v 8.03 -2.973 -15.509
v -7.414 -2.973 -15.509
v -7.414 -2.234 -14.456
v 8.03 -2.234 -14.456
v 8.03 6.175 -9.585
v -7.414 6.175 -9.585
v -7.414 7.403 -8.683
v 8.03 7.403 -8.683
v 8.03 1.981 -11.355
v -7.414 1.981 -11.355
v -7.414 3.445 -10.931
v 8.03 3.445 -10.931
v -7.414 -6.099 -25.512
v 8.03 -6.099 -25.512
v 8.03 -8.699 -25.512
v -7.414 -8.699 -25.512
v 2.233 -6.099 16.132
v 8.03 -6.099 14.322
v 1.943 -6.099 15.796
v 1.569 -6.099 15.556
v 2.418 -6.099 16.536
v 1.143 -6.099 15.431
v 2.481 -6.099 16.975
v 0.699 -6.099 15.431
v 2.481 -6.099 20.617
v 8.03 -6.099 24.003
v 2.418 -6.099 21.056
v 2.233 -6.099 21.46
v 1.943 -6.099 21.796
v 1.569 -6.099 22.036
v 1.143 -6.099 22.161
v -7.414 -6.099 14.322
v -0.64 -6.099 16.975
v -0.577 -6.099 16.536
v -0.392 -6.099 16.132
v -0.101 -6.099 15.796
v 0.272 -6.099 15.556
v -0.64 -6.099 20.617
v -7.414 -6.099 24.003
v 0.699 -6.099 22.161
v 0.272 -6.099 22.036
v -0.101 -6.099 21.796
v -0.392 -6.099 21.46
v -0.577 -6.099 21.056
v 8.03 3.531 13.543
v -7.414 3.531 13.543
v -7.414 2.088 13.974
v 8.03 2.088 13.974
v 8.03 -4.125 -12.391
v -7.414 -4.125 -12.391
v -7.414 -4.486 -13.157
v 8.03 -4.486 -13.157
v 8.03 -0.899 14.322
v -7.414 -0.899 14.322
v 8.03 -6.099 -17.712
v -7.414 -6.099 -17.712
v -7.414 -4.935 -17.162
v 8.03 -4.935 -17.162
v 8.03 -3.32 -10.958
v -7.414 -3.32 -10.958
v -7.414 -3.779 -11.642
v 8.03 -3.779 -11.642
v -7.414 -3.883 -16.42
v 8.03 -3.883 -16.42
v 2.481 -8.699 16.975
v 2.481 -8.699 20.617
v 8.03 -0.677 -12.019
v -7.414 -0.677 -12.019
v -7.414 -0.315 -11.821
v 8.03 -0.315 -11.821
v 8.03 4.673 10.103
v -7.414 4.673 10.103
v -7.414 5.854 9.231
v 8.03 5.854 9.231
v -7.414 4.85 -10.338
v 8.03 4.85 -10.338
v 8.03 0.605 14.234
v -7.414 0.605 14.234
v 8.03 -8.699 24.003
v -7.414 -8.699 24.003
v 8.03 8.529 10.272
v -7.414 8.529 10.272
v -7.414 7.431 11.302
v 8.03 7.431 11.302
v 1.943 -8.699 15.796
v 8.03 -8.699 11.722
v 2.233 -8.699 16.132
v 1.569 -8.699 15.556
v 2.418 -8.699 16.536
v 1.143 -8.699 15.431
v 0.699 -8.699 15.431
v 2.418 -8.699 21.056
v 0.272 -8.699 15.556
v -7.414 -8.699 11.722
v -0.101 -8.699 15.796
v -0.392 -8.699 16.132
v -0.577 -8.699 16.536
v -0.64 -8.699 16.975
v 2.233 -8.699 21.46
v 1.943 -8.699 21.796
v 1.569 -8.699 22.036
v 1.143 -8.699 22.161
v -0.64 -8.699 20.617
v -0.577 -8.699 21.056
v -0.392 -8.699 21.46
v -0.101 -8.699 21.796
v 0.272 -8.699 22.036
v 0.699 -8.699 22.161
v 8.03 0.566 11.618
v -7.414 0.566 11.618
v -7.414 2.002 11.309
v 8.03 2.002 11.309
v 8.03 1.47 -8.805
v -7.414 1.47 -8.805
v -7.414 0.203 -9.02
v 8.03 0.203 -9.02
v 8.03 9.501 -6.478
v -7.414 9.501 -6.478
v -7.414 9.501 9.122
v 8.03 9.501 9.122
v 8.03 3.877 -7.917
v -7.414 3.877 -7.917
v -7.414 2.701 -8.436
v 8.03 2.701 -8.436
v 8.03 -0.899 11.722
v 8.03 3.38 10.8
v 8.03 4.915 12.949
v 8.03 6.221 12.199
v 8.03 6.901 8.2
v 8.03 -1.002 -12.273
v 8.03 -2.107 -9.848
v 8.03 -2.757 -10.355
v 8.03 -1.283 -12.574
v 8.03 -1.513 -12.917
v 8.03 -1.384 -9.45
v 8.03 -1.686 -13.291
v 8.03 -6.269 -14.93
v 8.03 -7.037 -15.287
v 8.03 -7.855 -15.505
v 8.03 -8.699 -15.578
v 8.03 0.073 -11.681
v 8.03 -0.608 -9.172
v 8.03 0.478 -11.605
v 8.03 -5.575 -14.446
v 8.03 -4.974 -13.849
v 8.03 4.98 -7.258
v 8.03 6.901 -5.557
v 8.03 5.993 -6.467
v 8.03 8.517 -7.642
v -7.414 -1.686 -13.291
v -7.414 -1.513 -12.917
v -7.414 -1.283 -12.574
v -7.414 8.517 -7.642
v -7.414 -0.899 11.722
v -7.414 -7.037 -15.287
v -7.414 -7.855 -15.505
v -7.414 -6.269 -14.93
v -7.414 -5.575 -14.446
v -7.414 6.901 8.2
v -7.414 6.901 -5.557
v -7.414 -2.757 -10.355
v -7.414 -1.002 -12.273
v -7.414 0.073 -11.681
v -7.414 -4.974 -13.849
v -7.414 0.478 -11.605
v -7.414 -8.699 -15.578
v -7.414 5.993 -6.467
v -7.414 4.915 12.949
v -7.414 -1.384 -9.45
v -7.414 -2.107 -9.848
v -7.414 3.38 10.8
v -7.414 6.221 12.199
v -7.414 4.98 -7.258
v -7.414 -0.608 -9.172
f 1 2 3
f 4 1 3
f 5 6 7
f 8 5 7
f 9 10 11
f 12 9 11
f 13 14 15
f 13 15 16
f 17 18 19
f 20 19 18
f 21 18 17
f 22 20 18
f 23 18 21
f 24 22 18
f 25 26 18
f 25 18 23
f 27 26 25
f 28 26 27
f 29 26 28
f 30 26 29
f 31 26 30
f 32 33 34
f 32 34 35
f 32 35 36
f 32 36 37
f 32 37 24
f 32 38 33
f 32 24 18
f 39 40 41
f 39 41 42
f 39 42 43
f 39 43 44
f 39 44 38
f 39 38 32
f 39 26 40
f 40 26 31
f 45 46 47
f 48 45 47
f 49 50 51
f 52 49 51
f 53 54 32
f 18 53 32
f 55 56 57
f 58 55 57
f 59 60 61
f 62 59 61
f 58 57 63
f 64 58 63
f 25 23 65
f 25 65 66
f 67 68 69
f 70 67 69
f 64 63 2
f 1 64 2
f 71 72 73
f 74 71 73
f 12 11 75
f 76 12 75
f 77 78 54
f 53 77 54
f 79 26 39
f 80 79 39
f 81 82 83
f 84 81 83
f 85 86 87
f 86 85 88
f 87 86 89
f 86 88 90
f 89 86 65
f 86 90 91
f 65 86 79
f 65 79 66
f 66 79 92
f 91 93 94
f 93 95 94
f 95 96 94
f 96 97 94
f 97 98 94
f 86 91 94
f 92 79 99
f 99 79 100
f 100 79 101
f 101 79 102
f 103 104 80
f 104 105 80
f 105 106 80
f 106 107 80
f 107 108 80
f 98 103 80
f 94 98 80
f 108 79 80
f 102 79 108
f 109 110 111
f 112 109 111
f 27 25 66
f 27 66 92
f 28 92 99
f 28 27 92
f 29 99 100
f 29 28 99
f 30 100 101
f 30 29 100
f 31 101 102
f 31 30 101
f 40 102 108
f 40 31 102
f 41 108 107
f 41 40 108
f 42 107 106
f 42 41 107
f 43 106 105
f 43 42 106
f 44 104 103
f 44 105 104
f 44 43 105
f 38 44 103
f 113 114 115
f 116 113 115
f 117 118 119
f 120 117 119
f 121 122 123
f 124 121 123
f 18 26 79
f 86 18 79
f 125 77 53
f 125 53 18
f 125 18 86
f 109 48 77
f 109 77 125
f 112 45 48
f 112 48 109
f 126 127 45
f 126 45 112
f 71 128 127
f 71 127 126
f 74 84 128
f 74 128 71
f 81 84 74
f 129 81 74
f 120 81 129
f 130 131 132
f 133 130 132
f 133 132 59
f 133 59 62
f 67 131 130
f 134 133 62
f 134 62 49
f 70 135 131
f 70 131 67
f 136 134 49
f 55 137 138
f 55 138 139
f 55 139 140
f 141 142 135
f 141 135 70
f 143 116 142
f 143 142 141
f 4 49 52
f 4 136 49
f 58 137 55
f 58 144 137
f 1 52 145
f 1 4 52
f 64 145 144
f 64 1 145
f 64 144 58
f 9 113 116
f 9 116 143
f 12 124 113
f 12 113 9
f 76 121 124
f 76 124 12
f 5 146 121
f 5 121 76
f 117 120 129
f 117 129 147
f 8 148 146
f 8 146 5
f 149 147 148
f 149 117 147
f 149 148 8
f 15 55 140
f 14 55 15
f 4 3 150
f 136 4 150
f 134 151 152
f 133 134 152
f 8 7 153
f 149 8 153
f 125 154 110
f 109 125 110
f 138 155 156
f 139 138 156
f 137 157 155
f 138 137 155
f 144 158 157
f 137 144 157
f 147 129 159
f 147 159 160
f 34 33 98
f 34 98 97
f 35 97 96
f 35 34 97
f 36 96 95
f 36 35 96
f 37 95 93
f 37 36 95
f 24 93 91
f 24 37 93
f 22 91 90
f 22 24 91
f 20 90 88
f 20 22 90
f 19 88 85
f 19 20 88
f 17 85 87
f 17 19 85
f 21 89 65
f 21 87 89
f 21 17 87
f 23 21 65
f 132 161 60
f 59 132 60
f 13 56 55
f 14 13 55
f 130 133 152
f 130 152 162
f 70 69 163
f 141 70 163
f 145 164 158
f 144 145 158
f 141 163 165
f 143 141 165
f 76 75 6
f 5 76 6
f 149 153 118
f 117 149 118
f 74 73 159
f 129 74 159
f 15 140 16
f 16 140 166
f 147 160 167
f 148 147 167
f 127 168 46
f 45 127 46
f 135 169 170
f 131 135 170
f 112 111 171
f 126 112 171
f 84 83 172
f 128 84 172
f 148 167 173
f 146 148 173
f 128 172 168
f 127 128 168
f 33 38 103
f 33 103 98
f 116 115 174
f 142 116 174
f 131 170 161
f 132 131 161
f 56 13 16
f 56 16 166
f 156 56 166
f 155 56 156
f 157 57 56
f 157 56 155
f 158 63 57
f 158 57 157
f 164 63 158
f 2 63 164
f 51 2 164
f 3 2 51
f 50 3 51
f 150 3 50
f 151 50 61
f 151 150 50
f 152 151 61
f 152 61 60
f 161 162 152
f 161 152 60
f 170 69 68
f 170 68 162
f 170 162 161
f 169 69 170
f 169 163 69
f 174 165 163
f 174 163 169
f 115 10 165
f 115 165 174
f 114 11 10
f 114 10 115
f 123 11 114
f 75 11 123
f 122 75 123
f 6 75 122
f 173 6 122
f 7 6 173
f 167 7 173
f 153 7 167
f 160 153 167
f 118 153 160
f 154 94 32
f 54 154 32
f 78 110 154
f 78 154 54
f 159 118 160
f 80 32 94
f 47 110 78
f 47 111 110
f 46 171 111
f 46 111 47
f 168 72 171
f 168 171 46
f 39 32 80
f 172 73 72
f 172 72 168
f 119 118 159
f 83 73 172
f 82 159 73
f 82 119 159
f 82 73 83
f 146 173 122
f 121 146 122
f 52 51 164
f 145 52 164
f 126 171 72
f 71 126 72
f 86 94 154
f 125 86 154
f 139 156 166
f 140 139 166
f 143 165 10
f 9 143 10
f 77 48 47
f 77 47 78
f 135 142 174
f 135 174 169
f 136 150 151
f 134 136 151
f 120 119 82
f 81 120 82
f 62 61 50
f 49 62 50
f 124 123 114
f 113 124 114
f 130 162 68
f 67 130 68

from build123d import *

# Parameters (mm, degrees)
CUT_EXTRUDE1_START   = -0.299999985
CUT_EXTRUDE1_DEPTH   = 0.099999976
CUT_EXTRUDE1_2_DEPTH = 0.624999986
CUT_EXTRUDE2_REACH   = 3.369
CUT_EXTRUDE3_DEPTH   = 0.099999976
CUT_EXTRUDE4_DEPTH   = 2.439835087
SKETCH8_W            = 0.45707022
SKETCH8_H            = 0.126497466
CUT_EXTRUDE5_DEPTH   = 2.36862159
BOSS_EXTRUDE1_DEPTH  = 0.3
SKETCH10_W           = 0.320867719
SKETCH10_H           = 0.471779159
BOSS_EXTRUDE2_DEPTH  = 0.1
CUT_EXTRUDE6_DEPTH   = 2.347497156
SKETCH12_W           = 0.905202631
SKETCH12_H           = 0.17588134
CUT_EXTRUDE7_DEPTH   = 2.347497156
SKETCH13_W           = 2.413938714
SKETCH13_H           = 1.247285026
CUT_EXTRUDE8_DEPTH   = 0.03
SKETCH14_W           = 2.254507246
SKETCH14_H           = 1.130570224
CUT_EXTRUDE9_DEPTH   = 0.001
SCALE1_SCALE         = 26


with BuildPart() as part:
    # Cut-Extrude1: read off the stored shape, not the designer's step
    # Cut-Extrude1 outline → Cut-Extrude1 (new body)
    with BuildSketch(Plane(origin=(0, 0, 0), x_dir=(-1, 0, 0), z_dir=(0, 1, 0)).offset(CUT_EXTRUDE1_START)):
        Polygon((-0.103293976, 1.023100922), (-0.125000006, 1.025000005), (-0.500000024, 1.025000005), (-0.52170601, 1.023100922), (-0.542752503, 1.017461531), (-0.562499976, 1.008253195), (-0.580348424, 0.995755661), (-0.595755526, 0.980348443), (-0.608253176, 0.962500053), (-0.61746157, 0.942752522), (-0.623101019, 0.921706087), (-0.624999986, 0.899999985), (-0.624999986, -1.025000005), (-0.623101019, -1.046706107), (-0.61746157, -1.067752484), (-0.608253176, -1.087500015), (-0.595755526, -1.105348463), (-0.580348424, -1.120755565), (-0.562499976, -1.133253216), (-0.542752503, -1.142461551), (-0.52170601, -1.148100942), (-0.500000024, -1.150000026), (-0.125000006, -1.150000026), (-0.103293976, -1.148100942), (-0.082247483, -1.142461551), (-0.062500003, -1.133253216), (-0.044651548, -1.120755565), (-0.029244446, -1.105348463), (-0.016746824, -1.087500015), (-0.007538422, -1.067752484), (-0.001899031, -1.046706107), (0, -1.025000005), (0, 0.899999985), (-0.001899031, 0.921706087), (-0.007538422, 0.942752522), (-0.016746824, 0.962500053), (-0.029244446, 0.980348443), (-0.044651548, 0.995755661), (-0.062500003, 1.008253195), (-0.082247483, 1.017461531), align=None)
    extrude(amount=CUT_EXTRUDE1_DEPTH)

    # Cut-Extrude1 2 outline → Cut-Extrude1 2 (add)
    with BuildSketch(Plane.YZ):
        Polygon((0.057826259, 0.496644876), (0, 0.500000024), (-0.200000009, 0.500000024), (-0.200000009, -0.73204824), (-0.155237081, -0.710894703), (-0.114767128, -0.682375045), (-0.079790305, -0.647334848), (-0.051343839, -0.60681341), (-0.030271342, -0.562012312), (-0.023619925, -0.547616393), (-0.014776401, -0.534452964), (-0.003963165, -0.522853108), (0.008547848, -0.513108505), (0.022442007, -0.505464152), (0.037369897, -0.500112365), (0.0529561, -0.497187721), (0.110784524, -0.487572339), (0.167090067, -0.471254607), (0.22109873, -0.448458857), (0.272068108, -0.41949845), (0.319297513, -0.384771498), (0.362137827, -0.344755303), (0.400000019, -0.299999985), (0.400000019, 0.299999985), (0.362620107, 0.344247906), (0.320373714, 0.383875886), (0.273827725, 0.418351992), (0.223606796, 0.447213592), (0.170384956, 0.47007337), (0.114876457, 0.486624485), align=None)
    extrude(amount=CUT_EXTRUDE1_2_DEPTH)

    # Sketch2 → Cut-Extrude2 (cut, up to next)
    with BuildSketch(Plane.ZY, mode=Mode.PRIVATE) as cut_extrude2_sk1:
        Polygon((-0.65000006, -0.299999985), (0.400000019, -0.299999985), (0.400000019, 0), (0.396011048, 0.056349407), (0.384123705, 0.11157494), (0.364575157, 0.164575133), (0.337755162, 0.214292915), (0.304198737, 0.259736669), (0.264575152, 0.299999985), (-0.264575152, 0.299999985), (-0.299557927, 0.265075563), (-0.329965871, 0.226102915), (-0.355334574, 0.183677243), (-0.375276693, 0.138446456), (-0.389487541, 0.091101319), (-0.397750206, 0.042364885), (-0.403599464, 0.011192467), (-0.414303038, -0.01866331), (-0.429591688, -0.046451623), (-0.449080922, -0.07147366), (-0.472280721, -0.093100134), (-0.498607522, -0.110787172), (-0.527399301, -0.124090002), (-0.556858547, -0.137973097), (-0.583471148, -0.15674415), (-0.606434362, -0.179836949), (-0.625055342, -0.20655476), (-0.638772442, -0.236091611), (-0.647171808, -0.267556432), align=None)
    cut_extrude2_tool1 = extrude(cut_extrude2_sk1.sketch, amount=-CUT_EXTRUDE2_REACH, mode=Mode.PRIVATE) & part.part
    add(cut_extrude2_tool1.solids().sort_by_distance((0, -0.029264, -0.044377))[0], mode=Mode.SUBTRACT)

    # Sketch3 → Cut-Extrude3 (cut)
    with BuildSketch(Plane(origin=(0, -0.200000009, 0), x_dir=(-1, 0, 0), z_dir=(0, 1, 0))):
        Polygon((-0.231526632, 0.946749991), (-0.240874855, 0.960100675), (-0.252399361, 0.971625152), (-0.265749986, 0.98097336), (-0.280521112, 0.987861305), (-0.296263897, 0.992079498), (-0.312499993, 0.993499998), (-0.328736118, 0.992079498), (-0.344478874, 0.987861305), (-0.359249971, 0.98097336), (-0.372600654, 0.971625152), (-0.38412516, 0.960100675), (-0.393473398, 0.946749991), (-0.400361256, 0.931978866), (-0.404579536, 0.91623608), (-0.405999977, 0.899999985), (-0.405999977, 0.713000074), (-0.404579536, 0.69676392), (-0.400361256, 0.681021134), (-0.393473398, 0.666250009), (-0.38412516, 0.652899384), (-0.372600654, 0.641374907), (-0.359249971, 0.63202664), (-0.344478874, 0.625138753), (-0.328736118, 0.620920502), (-0.312499993, 0.619500061), (-0.296263897, 0.620920502), (-0.280521112, 0.625138753), (-0.265749986, 0.63202664), (-0.252399361, 0.641374907), (-0.240874855, 0.652899384), (-0.231526632, 0.666250009), (-0.224638745, 0.681021134), (-0.220420479, 0.69676392), (-0.219000009, 0.713000074), (-0.219000009, 0.899999985), (-0.220420479, 0.91623608), (-0.224638745, 0.931978866), align=None)
    extrude(amount=-CUT_EXTRUDE3_DEPTH, mode=Mode.SUBTRACT)

    # Sketch4 → Cut-Extrude4 (cut, through all)
    with BuildSketch(Plane(origin=(0, -0.200000009, 0), x_dir=(-1, 0, 0), z_dir=(0, 1, 0))):
        Polygon((-0.393473398, -1.07175007), (-0.38412516, -1.085100695), (-0.372600654, -1.09662523), (-0.359249971, -1.105973381), (-0.344478874, -1.112861326), (-0.328736118, -1.117079635), (-0.312499993, -1.118500018), (-0.296263897, -1.117079635), (-0.280521112, -1.112861326), (-0.265749986, -1.105973381), (-0.252399361, -1.09662523), (-0.240874855, -1.085100695), (-0.231526632, -1.07175007), (-0.224638745, -1.056978945), (-0.220420479, -1.041236101), (-0.219000009, -1.025000005), (-0.219000009, -0.837999978), (-0.220420479, -0.821763941), (-0.224638745, -0.806021097), (-0.231526632, -0.791249971), (-0.240874855, -0.777899404), (-0.252399361, -0.766374869), (-0.265749986, -0.757026661), (-0.280521112, -0.750138774), (-0.296263897, -0.745920464), (-0.312499993, -0.744499965), (-0.328736118, -0.745920464), (-0.344478874, -0.750138774), (-0.359249971, -0.757026661), (-0.372600654, -0.766374869), (-0.38412516, -0.777899404), (-0.393473398, -0.791249971), (-0.400361256, -0.806021097), (-0.404579536, -0.821763941), (-0.405999977, -0.837999978), (-0.405999977, -1.025000005), (-0.404579536, -1.041236101), (-0.400361256, -1.056978945), align=None)
    extrude(amount=-CUT_EXTRUDE4_DEPTH, mode=Mode.SUBTRACT)

    # Sketch8 → Cut-Extrude5 (cut, through all)
    with BuildSketch(Plane(origin=(0, 0, 0), x_dir=(0, 0, -1), z_dir=(1, 0, 0))):
        with Locations((0.96058335, -0.263248742)):
            Rectangle(SKETCH8_W, SKETCH8_H)
    extrude(amount=CUT_EXTRUDE5_DEPTH, mode=Mode.SUBTRACT)

    # Sketch9 → Boss-Extrude1 (add)
    with BuildSketch(Plane(origin=(0, 0, -0.73204824), x_dir=(-1, 0, 0), z_dir=(0, 0, -1))):
        Polygon((0, -0.299999985), (0, -0.200000009), (-0.624999986, -0.200000009), (-0.624999986, -0.278120473), (-0.624999986, -0.299999985), (-0.529422539, -0.299999985), (-0.519709533, -0.299999985), (-0.506867205, -0.299999985), (-0.490512573, -0.299999985), (-0.470477371, -0.299999985), (-0.447049913, -0.299999985), (-0.421272081, -0.299999985), (-0.395156344, -0.299999985), (-0.371582464, -0.299999985), (-0.353676372, -0.299999985), (-0.271323614, -0.299999985), (-0.253417547, -0.299999985), (-0.229843642, -0.299999985), (-0.203727882, -0.299999985), (-0.177950094, -0.299999985), (-0.154522634, -0.299999985), (-0.134487439, -0.299999985), (-0.118132789, -0.299999985), (-0.105290467, -0.299999985), (-0.095577447, -0.299999985), (-0.047916146, -0.299999985), align=None)
    extrude(amount=BOSS_EXTRUDE1_DEPTH)

    # Sketch10 → Boss-Extrude2 (add, through all)
    with BuildSketch(Plane(origin=(0, -0.200000009, 0), x_dir=(-1, 0, 0), z_dir=(0, 1, 0))):
        with Locations((-0.31112302, 0.768217279)):
            Rectangle(SKETCH10_W, SKETCH10_H)
    extrude(amount=-BOSS_EXTRUDE2_DEPTH)

    # Sketch11 → Cut-Extrude6 (cut, through all)
    with BuildSketch(Plane(origin=(0, -0.200000009, 0), x_dir=(-1, 0, 0), z_dir=(0, 1, 0))):
        with BuildLine():
            Line((-0.381567202, 0.602069646), (-0.381567202, 0.742122646))
            ThreePointArc((-0.381567202, 0.742122646), (-0.321550512, 0.802139336), (-0.261533822, 0.742122646))
            Line((-0.261533822, 0.742122646), (-0.261533822, 0.602069646))
            ThreePointArc((-0.261533822, 0.602069646), (-0.321550512, 0.542052956), (-0.381567202, 0.602069646))
        make_face()
    extrude(amount=-CUT_EXTRUDE6_DEPTH, mode=Mode.SUBTRACT)

    # Sketch12 → Cut-Extrude7 (cut, through all)
    with BuildSketch(Plane(origin=(0, -0.200000009, 0), x_dir=(-1, 0, 0), z_dir=(0, 1, 0))):
        with Locations((-0.289049147, 0.960305627)):
            Rectangle(SKETCH12_W, SKETCH12_H)
    extrude(amount=-CUT_EXTRUDE7_DEPTH, mode=Mode.SUBTRACT)

    # Sketch13 → Cut-Extrude8 (cut)
    with BuildSketch(Plane(origin=(0.624999986, 0, 0), x_dir=(0, 0, -1), z_dir=(1, 0, 0))):
        Rectangle(SKETCH13_W, SKETCH13_H)
    extrude(amount=-CUT_EXTRUDE8_DEPTH, mode=Mode.SUBTRACT)

    # Sketch14 → Cut-Extrude9 (cut)
    with BuildSketch(Plane.ZY):
        Rectangle(SKETCH14_W, SKETCH14_H)
    extrude(amount=-CUT_EXTRUDE9_DEPTH, mode=Mode.SUBTRACT)


with BuildPart() as part_1:
    # Scale1: scaled about (0.297584829, 0.035955959, -0.052860466)
    add(part.part.scale(SCALE1_SCALE).moved(Location((-7.439620725, -0.898898975, 1.32151165))))


solid = part_1.part
